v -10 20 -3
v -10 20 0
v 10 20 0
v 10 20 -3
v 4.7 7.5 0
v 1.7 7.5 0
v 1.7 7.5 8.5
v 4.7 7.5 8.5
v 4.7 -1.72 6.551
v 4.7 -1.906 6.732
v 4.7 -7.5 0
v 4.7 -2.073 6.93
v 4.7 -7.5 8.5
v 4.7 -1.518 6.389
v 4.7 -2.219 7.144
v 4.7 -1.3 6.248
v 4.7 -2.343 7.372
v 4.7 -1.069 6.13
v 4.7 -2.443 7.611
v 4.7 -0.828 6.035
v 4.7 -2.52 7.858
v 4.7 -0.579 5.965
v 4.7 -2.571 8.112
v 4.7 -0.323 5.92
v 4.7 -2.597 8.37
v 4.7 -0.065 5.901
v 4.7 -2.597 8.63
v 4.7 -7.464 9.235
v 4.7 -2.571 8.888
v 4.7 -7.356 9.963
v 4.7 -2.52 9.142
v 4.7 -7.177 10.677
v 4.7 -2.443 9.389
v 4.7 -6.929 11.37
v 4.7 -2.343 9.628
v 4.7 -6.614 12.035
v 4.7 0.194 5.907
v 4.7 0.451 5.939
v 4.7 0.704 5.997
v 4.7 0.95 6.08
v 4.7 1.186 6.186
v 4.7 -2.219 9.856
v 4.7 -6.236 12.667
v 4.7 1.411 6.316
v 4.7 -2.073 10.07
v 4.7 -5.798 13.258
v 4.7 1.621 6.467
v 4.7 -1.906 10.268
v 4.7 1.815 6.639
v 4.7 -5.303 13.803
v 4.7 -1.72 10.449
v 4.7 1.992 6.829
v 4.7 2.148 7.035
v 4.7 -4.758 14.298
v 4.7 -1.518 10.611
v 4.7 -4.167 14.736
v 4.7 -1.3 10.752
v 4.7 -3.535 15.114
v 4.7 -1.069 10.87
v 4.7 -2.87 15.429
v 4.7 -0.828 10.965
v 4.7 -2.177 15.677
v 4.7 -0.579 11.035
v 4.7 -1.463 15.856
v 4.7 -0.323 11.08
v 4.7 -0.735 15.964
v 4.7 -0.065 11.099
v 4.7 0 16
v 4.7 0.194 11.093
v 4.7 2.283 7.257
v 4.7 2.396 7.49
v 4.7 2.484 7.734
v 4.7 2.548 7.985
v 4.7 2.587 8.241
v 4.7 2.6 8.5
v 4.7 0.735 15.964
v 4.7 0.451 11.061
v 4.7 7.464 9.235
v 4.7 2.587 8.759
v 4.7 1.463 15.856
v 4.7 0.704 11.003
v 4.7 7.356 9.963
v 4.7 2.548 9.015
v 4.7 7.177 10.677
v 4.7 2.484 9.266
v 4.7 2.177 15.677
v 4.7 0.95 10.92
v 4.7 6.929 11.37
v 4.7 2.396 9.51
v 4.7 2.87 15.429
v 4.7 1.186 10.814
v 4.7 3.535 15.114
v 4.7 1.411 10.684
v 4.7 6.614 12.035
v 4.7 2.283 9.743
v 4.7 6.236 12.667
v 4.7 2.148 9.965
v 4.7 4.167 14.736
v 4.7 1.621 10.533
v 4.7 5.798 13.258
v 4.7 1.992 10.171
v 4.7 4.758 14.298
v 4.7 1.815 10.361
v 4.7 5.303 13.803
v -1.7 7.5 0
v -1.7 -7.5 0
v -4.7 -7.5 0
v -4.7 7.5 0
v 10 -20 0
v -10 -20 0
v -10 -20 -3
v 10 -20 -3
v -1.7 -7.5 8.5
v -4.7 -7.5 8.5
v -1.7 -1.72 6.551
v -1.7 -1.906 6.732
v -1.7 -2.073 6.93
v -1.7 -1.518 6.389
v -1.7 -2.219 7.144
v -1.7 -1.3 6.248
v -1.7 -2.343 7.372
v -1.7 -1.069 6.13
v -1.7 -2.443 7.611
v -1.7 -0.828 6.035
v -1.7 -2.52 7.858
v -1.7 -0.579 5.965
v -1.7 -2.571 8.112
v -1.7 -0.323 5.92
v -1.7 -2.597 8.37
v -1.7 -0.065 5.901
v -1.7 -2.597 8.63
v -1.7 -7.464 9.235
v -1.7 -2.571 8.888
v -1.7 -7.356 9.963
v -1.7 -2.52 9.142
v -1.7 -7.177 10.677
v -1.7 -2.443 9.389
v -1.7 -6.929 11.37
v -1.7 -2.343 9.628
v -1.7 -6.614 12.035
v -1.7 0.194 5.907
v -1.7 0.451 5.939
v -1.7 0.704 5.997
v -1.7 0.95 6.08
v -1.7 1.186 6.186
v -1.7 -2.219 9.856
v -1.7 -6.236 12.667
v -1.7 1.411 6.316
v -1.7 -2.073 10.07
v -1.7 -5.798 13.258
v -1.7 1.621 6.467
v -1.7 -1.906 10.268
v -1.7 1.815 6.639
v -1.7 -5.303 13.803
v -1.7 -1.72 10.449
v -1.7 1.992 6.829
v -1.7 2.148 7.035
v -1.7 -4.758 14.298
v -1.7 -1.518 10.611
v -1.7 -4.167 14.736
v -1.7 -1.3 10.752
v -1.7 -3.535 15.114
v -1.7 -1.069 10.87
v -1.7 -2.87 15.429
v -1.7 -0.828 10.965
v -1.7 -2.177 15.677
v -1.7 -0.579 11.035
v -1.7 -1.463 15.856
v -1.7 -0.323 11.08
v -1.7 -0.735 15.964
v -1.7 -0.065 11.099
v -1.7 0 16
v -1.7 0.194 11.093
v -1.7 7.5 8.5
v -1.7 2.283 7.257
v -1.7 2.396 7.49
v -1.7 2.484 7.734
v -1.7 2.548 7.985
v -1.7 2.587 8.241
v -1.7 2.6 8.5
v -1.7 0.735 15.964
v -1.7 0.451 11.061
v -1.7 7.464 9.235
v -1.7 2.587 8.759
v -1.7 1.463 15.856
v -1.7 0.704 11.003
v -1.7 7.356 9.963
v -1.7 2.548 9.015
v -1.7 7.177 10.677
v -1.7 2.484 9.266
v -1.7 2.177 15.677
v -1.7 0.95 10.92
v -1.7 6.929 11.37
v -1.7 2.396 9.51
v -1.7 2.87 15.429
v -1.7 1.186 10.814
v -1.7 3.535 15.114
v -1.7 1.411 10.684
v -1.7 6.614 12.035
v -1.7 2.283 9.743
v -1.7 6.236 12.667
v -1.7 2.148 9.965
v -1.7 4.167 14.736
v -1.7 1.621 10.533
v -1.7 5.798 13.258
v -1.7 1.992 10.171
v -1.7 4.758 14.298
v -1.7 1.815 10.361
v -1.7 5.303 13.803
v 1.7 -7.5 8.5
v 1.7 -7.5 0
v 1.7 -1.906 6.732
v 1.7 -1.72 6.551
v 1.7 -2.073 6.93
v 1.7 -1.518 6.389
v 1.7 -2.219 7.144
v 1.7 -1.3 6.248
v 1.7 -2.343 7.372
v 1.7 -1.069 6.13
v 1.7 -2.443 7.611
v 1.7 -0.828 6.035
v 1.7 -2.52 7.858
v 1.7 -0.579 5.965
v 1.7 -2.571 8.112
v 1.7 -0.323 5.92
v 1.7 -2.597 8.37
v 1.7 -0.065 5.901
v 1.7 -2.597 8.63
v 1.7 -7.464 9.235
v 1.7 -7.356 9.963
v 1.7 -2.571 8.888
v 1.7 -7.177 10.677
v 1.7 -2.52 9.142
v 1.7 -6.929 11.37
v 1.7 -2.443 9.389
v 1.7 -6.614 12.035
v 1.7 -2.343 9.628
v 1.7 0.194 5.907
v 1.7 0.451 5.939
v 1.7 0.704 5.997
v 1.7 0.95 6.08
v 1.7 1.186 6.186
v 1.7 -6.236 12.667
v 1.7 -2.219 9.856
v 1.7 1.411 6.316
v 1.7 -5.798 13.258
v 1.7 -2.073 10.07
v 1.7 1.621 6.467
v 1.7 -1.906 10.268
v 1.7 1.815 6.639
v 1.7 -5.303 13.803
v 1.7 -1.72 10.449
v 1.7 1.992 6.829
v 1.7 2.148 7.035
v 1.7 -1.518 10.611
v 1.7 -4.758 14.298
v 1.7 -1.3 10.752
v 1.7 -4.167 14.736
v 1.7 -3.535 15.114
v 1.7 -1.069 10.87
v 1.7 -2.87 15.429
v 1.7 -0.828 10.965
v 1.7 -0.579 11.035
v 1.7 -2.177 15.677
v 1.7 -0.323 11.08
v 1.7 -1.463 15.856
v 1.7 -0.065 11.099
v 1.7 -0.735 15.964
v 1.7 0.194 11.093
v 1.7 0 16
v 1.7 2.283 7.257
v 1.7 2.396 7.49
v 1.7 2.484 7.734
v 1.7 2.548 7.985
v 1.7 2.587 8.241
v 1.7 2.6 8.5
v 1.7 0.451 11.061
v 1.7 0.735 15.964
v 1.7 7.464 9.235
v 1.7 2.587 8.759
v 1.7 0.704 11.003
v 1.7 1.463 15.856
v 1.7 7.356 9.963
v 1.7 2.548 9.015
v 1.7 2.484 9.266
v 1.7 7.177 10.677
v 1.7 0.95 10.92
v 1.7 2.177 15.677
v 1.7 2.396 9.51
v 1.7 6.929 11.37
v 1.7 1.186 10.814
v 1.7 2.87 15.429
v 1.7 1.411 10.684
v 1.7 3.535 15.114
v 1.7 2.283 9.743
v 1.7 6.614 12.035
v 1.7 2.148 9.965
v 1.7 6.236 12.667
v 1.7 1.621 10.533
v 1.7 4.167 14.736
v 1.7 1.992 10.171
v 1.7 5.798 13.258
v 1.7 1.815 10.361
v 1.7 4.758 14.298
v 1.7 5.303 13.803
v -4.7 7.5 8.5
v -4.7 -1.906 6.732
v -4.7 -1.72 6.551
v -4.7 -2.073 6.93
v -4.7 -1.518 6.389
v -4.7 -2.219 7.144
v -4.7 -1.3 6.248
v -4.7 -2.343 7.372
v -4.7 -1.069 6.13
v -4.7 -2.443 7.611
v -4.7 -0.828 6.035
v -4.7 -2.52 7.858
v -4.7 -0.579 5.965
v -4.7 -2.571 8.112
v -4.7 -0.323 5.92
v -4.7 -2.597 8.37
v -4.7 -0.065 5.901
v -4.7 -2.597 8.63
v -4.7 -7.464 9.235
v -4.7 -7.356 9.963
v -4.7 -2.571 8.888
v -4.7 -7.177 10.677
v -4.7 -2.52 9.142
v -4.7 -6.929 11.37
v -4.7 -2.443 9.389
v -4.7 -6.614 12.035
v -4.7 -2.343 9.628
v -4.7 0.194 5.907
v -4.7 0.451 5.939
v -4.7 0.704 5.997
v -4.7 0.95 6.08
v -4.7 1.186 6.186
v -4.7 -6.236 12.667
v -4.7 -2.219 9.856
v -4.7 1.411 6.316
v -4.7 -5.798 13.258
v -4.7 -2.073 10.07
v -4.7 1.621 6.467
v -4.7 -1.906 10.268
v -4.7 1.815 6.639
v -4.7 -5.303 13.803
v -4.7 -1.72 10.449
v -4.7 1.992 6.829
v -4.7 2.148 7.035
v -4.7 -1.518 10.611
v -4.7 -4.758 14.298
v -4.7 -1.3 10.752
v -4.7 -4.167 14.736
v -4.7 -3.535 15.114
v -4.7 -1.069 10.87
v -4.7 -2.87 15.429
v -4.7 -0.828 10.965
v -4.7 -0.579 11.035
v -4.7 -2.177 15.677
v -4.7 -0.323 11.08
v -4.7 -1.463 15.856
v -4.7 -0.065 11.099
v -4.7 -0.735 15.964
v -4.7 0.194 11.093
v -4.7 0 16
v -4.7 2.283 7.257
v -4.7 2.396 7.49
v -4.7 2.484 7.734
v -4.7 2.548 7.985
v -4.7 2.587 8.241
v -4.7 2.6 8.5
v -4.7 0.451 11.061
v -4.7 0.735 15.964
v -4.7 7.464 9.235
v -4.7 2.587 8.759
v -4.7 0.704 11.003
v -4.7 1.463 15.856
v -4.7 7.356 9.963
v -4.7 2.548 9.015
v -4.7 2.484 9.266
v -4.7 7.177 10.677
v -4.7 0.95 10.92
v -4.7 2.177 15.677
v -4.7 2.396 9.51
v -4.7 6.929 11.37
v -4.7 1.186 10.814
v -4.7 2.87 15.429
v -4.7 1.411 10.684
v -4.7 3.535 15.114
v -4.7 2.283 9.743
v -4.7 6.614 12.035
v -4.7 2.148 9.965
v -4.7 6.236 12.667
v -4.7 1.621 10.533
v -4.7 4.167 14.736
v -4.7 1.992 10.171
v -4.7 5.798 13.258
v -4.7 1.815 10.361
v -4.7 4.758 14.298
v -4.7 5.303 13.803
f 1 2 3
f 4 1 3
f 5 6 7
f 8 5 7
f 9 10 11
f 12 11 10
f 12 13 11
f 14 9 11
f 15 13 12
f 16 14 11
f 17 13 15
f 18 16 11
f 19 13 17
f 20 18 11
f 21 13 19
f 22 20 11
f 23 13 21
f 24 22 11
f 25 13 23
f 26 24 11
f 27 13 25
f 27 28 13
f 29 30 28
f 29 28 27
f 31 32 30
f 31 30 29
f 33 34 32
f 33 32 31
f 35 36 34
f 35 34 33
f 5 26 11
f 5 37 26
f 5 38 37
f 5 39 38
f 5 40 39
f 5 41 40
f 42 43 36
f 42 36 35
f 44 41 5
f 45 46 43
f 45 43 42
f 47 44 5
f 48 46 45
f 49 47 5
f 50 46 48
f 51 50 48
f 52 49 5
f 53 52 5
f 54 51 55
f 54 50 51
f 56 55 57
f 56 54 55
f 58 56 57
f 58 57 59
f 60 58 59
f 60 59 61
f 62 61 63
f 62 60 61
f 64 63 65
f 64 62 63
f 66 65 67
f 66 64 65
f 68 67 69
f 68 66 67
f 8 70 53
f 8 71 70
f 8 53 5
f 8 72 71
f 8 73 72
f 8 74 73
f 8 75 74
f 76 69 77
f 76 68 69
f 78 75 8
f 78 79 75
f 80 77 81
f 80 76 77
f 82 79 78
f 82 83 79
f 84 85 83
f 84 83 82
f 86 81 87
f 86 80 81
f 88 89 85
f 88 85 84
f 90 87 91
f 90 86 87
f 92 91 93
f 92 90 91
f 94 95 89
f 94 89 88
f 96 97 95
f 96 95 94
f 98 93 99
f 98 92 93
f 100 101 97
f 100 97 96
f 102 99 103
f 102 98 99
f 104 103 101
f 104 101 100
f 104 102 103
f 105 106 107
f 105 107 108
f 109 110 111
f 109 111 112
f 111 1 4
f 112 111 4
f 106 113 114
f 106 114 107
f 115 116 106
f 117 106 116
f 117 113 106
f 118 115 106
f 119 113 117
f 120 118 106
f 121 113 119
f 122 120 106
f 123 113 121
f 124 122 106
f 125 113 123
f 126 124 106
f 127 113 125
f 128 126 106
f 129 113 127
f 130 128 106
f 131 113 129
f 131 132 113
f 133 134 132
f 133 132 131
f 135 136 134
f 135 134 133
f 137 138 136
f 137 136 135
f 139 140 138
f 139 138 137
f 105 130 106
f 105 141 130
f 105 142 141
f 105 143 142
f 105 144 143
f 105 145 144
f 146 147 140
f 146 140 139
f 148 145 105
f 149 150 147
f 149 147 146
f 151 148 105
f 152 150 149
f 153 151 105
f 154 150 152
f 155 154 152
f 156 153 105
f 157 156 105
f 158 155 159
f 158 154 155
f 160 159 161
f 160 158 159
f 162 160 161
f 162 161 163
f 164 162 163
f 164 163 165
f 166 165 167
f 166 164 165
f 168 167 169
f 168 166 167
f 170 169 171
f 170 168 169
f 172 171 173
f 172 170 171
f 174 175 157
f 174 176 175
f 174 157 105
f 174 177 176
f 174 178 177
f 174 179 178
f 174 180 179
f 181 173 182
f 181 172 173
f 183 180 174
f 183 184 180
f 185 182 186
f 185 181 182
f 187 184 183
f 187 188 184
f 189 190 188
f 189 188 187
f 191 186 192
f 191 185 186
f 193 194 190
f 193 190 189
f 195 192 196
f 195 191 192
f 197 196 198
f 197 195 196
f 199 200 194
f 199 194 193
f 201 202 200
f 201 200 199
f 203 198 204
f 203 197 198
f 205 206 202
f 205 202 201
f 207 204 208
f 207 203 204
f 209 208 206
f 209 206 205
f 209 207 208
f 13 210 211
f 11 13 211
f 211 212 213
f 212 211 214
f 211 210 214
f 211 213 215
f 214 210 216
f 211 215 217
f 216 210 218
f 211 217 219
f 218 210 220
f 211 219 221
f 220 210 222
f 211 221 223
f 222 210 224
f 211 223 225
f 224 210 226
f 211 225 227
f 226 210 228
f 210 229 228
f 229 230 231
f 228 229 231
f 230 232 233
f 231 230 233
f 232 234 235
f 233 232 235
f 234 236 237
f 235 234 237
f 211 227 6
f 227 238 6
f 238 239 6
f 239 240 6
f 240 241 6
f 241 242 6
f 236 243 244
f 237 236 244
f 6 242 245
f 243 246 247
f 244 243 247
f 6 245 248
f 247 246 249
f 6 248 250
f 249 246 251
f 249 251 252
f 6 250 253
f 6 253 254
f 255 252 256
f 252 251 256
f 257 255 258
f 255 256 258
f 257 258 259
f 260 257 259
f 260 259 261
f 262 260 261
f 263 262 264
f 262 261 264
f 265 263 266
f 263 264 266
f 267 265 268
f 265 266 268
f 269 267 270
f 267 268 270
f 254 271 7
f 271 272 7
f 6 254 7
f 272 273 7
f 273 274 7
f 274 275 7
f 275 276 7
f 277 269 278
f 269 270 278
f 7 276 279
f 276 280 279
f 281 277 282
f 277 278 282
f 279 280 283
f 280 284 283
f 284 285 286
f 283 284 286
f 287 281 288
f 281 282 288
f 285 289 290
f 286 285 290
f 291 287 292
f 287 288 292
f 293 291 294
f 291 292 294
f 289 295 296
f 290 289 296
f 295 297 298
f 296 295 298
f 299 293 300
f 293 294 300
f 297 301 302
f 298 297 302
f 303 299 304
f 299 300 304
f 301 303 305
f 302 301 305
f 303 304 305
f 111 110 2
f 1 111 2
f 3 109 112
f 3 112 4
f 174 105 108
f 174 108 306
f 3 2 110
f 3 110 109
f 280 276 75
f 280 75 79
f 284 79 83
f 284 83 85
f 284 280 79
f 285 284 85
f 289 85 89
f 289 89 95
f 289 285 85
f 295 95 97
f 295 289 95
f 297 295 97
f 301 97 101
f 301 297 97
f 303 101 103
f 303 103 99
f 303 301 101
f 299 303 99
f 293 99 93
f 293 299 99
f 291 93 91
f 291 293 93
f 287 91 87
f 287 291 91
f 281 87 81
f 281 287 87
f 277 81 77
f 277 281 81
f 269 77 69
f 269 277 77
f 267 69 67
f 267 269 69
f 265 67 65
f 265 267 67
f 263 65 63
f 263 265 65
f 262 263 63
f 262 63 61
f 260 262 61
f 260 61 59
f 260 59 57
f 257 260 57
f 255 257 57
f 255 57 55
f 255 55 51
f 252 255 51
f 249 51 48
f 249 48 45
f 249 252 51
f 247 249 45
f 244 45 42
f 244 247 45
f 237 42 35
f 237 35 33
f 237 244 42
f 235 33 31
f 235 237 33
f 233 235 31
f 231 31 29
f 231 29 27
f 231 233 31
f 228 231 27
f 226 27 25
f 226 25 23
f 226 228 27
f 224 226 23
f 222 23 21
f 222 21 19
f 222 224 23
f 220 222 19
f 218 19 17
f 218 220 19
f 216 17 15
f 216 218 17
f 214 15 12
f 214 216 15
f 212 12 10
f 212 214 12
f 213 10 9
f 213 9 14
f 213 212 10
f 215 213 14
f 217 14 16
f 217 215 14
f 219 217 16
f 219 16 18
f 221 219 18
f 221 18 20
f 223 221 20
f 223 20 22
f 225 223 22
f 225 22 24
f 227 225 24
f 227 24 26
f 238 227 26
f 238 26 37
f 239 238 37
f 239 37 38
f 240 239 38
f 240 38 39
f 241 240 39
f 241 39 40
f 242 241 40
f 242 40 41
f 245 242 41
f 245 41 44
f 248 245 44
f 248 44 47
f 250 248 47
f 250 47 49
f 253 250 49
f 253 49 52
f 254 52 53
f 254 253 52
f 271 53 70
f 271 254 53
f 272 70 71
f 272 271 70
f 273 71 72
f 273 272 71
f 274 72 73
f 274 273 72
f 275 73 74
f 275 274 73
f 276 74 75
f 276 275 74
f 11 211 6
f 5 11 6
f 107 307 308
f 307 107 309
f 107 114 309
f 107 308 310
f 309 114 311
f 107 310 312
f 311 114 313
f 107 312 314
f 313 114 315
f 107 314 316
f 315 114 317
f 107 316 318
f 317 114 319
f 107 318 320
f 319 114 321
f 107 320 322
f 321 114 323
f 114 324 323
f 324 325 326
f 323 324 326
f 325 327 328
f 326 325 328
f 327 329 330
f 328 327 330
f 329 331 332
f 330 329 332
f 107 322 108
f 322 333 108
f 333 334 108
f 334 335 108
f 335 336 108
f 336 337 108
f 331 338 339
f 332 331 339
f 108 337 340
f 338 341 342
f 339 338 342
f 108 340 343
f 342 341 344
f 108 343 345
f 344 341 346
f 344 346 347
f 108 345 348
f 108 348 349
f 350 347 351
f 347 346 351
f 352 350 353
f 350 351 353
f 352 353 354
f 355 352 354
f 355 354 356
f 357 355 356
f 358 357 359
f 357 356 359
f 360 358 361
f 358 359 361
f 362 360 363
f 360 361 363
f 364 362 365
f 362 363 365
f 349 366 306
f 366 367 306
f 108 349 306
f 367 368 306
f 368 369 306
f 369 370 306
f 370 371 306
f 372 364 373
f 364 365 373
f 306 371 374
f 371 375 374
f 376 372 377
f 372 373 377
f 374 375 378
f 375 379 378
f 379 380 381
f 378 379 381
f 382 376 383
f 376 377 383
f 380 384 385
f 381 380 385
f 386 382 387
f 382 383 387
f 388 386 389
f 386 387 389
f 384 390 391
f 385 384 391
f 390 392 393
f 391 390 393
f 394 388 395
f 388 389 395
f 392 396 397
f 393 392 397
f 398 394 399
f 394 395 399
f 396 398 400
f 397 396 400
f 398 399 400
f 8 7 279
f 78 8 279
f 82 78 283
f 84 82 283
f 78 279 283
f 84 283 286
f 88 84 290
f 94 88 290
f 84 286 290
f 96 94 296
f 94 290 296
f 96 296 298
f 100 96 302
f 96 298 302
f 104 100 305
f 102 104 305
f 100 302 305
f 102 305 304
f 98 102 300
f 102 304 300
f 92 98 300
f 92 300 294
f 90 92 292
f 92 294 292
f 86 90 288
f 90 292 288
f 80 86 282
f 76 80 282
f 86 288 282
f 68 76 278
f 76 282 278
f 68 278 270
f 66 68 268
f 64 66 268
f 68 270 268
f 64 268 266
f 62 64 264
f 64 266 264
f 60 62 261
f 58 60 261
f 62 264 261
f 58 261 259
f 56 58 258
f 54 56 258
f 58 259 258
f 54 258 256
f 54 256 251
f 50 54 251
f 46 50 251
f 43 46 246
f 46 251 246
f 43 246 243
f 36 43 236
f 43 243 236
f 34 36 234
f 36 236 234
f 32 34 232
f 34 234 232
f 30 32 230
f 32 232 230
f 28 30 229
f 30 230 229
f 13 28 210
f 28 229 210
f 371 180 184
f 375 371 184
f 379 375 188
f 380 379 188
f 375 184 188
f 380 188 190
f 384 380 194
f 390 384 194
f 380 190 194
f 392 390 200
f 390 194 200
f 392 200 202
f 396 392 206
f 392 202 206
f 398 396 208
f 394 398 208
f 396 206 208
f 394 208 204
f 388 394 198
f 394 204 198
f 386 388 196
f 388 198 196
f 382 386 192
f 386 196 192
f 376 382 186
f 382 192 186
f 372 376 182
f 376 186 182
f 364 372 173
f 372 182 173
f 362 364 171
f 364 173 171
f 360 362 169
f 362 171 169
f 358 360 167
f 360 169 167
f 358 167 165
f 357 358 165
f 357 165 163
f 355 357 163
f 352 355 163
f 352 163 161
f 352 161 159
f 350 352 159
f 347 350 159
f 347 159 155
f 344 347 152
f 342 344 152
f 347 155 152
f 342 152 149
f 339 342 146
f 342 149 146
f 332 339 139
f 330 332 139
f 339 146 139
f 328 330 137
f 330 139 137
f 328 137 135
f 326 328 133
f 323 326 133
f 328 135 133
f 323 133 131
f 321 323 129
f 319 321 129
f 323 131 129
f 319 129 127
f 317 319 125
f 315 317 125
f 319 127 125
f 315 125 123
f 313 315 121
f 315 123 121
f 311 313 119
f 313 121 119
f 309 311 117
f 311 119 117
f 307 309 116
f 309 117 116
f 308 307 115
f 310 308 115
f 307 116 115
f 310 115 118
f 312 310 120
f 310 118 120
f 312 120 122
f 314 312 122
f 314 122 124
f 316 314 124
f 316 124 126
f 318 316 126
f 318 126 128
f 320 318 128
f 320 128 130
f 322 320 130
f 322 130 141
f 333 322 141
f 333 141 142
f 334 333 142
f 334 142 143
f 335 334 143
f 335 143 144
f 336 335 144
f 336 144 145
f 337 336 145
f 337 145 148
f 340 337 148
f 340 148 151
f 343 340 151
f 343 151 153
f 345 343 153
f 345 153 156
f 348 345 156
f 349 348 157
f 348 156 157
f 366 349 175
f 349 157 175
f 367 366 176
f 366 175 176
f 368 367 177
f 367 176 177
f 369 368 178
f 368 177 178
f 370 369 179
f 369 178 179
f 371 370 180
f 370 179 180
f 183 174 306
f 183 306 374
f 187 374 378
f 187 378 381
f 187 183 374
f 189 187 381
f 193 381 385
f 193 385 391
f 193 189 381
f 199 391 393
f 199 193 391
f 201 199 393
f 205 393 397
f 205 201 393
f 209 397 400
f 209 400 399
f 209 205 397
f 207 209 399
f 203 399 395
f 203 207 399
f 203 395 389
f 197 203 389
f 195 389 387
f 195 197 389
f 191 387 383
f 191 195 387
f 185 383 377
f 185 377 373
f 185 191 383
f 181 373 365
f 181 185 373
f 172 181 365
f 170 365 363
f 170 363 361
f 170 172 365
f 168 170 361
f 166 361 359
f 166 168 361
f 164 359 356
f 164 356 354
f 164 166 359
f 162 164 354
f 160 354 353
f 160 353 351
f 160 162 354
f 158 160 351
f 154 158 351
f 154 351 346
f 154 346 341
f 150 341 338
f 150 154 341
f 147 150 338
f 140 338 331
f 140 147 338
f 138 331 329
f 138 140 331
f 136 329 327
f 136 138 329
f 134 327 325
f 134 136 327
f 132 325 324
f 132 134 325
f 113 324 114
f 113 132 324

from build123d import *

# Parameters (mm, degrees)
F1_R     = 2.6
F2_DEPTH = 3
F4_W     = 20
F4_H     = 40
F5_DEPTH = 3


with BuildPart() as f2:
    # F1 (on offset) → F2 (new body)
    with BuildSketch(Plane.YZ.offset(1.7)):
        with BuildLine():
            Line((7.5, 0), (7.5, 8.5))
            ThreePointArc((7.5, 8.5), (0, 16), (-7.5, 8.5))
            Line((-7.5, 8.5), (-7.5, 0))
            Line((-7.5, 0), (7.5, 0))
        make_face()
        with Locations((0, 8.5)):
            Circle(F1_R, mode=Mode.SUBTRACT)
    extrude(amount=F2_DEPTH)


with BuildPart() as f3_1:
    # F3: instance of F2
    add(f2.part.mirror(Plane.YZ))


with BuildPart() as f5:
    # F4 (on Top) → F5 (new body)
    with BuildSketch(Plane.XY):
        Rectangle(F4_W, F4_H)
    extrude(amount=-F5_DEPTH)


solid = Compound([f2.part, f3_1.part, f5.part])
